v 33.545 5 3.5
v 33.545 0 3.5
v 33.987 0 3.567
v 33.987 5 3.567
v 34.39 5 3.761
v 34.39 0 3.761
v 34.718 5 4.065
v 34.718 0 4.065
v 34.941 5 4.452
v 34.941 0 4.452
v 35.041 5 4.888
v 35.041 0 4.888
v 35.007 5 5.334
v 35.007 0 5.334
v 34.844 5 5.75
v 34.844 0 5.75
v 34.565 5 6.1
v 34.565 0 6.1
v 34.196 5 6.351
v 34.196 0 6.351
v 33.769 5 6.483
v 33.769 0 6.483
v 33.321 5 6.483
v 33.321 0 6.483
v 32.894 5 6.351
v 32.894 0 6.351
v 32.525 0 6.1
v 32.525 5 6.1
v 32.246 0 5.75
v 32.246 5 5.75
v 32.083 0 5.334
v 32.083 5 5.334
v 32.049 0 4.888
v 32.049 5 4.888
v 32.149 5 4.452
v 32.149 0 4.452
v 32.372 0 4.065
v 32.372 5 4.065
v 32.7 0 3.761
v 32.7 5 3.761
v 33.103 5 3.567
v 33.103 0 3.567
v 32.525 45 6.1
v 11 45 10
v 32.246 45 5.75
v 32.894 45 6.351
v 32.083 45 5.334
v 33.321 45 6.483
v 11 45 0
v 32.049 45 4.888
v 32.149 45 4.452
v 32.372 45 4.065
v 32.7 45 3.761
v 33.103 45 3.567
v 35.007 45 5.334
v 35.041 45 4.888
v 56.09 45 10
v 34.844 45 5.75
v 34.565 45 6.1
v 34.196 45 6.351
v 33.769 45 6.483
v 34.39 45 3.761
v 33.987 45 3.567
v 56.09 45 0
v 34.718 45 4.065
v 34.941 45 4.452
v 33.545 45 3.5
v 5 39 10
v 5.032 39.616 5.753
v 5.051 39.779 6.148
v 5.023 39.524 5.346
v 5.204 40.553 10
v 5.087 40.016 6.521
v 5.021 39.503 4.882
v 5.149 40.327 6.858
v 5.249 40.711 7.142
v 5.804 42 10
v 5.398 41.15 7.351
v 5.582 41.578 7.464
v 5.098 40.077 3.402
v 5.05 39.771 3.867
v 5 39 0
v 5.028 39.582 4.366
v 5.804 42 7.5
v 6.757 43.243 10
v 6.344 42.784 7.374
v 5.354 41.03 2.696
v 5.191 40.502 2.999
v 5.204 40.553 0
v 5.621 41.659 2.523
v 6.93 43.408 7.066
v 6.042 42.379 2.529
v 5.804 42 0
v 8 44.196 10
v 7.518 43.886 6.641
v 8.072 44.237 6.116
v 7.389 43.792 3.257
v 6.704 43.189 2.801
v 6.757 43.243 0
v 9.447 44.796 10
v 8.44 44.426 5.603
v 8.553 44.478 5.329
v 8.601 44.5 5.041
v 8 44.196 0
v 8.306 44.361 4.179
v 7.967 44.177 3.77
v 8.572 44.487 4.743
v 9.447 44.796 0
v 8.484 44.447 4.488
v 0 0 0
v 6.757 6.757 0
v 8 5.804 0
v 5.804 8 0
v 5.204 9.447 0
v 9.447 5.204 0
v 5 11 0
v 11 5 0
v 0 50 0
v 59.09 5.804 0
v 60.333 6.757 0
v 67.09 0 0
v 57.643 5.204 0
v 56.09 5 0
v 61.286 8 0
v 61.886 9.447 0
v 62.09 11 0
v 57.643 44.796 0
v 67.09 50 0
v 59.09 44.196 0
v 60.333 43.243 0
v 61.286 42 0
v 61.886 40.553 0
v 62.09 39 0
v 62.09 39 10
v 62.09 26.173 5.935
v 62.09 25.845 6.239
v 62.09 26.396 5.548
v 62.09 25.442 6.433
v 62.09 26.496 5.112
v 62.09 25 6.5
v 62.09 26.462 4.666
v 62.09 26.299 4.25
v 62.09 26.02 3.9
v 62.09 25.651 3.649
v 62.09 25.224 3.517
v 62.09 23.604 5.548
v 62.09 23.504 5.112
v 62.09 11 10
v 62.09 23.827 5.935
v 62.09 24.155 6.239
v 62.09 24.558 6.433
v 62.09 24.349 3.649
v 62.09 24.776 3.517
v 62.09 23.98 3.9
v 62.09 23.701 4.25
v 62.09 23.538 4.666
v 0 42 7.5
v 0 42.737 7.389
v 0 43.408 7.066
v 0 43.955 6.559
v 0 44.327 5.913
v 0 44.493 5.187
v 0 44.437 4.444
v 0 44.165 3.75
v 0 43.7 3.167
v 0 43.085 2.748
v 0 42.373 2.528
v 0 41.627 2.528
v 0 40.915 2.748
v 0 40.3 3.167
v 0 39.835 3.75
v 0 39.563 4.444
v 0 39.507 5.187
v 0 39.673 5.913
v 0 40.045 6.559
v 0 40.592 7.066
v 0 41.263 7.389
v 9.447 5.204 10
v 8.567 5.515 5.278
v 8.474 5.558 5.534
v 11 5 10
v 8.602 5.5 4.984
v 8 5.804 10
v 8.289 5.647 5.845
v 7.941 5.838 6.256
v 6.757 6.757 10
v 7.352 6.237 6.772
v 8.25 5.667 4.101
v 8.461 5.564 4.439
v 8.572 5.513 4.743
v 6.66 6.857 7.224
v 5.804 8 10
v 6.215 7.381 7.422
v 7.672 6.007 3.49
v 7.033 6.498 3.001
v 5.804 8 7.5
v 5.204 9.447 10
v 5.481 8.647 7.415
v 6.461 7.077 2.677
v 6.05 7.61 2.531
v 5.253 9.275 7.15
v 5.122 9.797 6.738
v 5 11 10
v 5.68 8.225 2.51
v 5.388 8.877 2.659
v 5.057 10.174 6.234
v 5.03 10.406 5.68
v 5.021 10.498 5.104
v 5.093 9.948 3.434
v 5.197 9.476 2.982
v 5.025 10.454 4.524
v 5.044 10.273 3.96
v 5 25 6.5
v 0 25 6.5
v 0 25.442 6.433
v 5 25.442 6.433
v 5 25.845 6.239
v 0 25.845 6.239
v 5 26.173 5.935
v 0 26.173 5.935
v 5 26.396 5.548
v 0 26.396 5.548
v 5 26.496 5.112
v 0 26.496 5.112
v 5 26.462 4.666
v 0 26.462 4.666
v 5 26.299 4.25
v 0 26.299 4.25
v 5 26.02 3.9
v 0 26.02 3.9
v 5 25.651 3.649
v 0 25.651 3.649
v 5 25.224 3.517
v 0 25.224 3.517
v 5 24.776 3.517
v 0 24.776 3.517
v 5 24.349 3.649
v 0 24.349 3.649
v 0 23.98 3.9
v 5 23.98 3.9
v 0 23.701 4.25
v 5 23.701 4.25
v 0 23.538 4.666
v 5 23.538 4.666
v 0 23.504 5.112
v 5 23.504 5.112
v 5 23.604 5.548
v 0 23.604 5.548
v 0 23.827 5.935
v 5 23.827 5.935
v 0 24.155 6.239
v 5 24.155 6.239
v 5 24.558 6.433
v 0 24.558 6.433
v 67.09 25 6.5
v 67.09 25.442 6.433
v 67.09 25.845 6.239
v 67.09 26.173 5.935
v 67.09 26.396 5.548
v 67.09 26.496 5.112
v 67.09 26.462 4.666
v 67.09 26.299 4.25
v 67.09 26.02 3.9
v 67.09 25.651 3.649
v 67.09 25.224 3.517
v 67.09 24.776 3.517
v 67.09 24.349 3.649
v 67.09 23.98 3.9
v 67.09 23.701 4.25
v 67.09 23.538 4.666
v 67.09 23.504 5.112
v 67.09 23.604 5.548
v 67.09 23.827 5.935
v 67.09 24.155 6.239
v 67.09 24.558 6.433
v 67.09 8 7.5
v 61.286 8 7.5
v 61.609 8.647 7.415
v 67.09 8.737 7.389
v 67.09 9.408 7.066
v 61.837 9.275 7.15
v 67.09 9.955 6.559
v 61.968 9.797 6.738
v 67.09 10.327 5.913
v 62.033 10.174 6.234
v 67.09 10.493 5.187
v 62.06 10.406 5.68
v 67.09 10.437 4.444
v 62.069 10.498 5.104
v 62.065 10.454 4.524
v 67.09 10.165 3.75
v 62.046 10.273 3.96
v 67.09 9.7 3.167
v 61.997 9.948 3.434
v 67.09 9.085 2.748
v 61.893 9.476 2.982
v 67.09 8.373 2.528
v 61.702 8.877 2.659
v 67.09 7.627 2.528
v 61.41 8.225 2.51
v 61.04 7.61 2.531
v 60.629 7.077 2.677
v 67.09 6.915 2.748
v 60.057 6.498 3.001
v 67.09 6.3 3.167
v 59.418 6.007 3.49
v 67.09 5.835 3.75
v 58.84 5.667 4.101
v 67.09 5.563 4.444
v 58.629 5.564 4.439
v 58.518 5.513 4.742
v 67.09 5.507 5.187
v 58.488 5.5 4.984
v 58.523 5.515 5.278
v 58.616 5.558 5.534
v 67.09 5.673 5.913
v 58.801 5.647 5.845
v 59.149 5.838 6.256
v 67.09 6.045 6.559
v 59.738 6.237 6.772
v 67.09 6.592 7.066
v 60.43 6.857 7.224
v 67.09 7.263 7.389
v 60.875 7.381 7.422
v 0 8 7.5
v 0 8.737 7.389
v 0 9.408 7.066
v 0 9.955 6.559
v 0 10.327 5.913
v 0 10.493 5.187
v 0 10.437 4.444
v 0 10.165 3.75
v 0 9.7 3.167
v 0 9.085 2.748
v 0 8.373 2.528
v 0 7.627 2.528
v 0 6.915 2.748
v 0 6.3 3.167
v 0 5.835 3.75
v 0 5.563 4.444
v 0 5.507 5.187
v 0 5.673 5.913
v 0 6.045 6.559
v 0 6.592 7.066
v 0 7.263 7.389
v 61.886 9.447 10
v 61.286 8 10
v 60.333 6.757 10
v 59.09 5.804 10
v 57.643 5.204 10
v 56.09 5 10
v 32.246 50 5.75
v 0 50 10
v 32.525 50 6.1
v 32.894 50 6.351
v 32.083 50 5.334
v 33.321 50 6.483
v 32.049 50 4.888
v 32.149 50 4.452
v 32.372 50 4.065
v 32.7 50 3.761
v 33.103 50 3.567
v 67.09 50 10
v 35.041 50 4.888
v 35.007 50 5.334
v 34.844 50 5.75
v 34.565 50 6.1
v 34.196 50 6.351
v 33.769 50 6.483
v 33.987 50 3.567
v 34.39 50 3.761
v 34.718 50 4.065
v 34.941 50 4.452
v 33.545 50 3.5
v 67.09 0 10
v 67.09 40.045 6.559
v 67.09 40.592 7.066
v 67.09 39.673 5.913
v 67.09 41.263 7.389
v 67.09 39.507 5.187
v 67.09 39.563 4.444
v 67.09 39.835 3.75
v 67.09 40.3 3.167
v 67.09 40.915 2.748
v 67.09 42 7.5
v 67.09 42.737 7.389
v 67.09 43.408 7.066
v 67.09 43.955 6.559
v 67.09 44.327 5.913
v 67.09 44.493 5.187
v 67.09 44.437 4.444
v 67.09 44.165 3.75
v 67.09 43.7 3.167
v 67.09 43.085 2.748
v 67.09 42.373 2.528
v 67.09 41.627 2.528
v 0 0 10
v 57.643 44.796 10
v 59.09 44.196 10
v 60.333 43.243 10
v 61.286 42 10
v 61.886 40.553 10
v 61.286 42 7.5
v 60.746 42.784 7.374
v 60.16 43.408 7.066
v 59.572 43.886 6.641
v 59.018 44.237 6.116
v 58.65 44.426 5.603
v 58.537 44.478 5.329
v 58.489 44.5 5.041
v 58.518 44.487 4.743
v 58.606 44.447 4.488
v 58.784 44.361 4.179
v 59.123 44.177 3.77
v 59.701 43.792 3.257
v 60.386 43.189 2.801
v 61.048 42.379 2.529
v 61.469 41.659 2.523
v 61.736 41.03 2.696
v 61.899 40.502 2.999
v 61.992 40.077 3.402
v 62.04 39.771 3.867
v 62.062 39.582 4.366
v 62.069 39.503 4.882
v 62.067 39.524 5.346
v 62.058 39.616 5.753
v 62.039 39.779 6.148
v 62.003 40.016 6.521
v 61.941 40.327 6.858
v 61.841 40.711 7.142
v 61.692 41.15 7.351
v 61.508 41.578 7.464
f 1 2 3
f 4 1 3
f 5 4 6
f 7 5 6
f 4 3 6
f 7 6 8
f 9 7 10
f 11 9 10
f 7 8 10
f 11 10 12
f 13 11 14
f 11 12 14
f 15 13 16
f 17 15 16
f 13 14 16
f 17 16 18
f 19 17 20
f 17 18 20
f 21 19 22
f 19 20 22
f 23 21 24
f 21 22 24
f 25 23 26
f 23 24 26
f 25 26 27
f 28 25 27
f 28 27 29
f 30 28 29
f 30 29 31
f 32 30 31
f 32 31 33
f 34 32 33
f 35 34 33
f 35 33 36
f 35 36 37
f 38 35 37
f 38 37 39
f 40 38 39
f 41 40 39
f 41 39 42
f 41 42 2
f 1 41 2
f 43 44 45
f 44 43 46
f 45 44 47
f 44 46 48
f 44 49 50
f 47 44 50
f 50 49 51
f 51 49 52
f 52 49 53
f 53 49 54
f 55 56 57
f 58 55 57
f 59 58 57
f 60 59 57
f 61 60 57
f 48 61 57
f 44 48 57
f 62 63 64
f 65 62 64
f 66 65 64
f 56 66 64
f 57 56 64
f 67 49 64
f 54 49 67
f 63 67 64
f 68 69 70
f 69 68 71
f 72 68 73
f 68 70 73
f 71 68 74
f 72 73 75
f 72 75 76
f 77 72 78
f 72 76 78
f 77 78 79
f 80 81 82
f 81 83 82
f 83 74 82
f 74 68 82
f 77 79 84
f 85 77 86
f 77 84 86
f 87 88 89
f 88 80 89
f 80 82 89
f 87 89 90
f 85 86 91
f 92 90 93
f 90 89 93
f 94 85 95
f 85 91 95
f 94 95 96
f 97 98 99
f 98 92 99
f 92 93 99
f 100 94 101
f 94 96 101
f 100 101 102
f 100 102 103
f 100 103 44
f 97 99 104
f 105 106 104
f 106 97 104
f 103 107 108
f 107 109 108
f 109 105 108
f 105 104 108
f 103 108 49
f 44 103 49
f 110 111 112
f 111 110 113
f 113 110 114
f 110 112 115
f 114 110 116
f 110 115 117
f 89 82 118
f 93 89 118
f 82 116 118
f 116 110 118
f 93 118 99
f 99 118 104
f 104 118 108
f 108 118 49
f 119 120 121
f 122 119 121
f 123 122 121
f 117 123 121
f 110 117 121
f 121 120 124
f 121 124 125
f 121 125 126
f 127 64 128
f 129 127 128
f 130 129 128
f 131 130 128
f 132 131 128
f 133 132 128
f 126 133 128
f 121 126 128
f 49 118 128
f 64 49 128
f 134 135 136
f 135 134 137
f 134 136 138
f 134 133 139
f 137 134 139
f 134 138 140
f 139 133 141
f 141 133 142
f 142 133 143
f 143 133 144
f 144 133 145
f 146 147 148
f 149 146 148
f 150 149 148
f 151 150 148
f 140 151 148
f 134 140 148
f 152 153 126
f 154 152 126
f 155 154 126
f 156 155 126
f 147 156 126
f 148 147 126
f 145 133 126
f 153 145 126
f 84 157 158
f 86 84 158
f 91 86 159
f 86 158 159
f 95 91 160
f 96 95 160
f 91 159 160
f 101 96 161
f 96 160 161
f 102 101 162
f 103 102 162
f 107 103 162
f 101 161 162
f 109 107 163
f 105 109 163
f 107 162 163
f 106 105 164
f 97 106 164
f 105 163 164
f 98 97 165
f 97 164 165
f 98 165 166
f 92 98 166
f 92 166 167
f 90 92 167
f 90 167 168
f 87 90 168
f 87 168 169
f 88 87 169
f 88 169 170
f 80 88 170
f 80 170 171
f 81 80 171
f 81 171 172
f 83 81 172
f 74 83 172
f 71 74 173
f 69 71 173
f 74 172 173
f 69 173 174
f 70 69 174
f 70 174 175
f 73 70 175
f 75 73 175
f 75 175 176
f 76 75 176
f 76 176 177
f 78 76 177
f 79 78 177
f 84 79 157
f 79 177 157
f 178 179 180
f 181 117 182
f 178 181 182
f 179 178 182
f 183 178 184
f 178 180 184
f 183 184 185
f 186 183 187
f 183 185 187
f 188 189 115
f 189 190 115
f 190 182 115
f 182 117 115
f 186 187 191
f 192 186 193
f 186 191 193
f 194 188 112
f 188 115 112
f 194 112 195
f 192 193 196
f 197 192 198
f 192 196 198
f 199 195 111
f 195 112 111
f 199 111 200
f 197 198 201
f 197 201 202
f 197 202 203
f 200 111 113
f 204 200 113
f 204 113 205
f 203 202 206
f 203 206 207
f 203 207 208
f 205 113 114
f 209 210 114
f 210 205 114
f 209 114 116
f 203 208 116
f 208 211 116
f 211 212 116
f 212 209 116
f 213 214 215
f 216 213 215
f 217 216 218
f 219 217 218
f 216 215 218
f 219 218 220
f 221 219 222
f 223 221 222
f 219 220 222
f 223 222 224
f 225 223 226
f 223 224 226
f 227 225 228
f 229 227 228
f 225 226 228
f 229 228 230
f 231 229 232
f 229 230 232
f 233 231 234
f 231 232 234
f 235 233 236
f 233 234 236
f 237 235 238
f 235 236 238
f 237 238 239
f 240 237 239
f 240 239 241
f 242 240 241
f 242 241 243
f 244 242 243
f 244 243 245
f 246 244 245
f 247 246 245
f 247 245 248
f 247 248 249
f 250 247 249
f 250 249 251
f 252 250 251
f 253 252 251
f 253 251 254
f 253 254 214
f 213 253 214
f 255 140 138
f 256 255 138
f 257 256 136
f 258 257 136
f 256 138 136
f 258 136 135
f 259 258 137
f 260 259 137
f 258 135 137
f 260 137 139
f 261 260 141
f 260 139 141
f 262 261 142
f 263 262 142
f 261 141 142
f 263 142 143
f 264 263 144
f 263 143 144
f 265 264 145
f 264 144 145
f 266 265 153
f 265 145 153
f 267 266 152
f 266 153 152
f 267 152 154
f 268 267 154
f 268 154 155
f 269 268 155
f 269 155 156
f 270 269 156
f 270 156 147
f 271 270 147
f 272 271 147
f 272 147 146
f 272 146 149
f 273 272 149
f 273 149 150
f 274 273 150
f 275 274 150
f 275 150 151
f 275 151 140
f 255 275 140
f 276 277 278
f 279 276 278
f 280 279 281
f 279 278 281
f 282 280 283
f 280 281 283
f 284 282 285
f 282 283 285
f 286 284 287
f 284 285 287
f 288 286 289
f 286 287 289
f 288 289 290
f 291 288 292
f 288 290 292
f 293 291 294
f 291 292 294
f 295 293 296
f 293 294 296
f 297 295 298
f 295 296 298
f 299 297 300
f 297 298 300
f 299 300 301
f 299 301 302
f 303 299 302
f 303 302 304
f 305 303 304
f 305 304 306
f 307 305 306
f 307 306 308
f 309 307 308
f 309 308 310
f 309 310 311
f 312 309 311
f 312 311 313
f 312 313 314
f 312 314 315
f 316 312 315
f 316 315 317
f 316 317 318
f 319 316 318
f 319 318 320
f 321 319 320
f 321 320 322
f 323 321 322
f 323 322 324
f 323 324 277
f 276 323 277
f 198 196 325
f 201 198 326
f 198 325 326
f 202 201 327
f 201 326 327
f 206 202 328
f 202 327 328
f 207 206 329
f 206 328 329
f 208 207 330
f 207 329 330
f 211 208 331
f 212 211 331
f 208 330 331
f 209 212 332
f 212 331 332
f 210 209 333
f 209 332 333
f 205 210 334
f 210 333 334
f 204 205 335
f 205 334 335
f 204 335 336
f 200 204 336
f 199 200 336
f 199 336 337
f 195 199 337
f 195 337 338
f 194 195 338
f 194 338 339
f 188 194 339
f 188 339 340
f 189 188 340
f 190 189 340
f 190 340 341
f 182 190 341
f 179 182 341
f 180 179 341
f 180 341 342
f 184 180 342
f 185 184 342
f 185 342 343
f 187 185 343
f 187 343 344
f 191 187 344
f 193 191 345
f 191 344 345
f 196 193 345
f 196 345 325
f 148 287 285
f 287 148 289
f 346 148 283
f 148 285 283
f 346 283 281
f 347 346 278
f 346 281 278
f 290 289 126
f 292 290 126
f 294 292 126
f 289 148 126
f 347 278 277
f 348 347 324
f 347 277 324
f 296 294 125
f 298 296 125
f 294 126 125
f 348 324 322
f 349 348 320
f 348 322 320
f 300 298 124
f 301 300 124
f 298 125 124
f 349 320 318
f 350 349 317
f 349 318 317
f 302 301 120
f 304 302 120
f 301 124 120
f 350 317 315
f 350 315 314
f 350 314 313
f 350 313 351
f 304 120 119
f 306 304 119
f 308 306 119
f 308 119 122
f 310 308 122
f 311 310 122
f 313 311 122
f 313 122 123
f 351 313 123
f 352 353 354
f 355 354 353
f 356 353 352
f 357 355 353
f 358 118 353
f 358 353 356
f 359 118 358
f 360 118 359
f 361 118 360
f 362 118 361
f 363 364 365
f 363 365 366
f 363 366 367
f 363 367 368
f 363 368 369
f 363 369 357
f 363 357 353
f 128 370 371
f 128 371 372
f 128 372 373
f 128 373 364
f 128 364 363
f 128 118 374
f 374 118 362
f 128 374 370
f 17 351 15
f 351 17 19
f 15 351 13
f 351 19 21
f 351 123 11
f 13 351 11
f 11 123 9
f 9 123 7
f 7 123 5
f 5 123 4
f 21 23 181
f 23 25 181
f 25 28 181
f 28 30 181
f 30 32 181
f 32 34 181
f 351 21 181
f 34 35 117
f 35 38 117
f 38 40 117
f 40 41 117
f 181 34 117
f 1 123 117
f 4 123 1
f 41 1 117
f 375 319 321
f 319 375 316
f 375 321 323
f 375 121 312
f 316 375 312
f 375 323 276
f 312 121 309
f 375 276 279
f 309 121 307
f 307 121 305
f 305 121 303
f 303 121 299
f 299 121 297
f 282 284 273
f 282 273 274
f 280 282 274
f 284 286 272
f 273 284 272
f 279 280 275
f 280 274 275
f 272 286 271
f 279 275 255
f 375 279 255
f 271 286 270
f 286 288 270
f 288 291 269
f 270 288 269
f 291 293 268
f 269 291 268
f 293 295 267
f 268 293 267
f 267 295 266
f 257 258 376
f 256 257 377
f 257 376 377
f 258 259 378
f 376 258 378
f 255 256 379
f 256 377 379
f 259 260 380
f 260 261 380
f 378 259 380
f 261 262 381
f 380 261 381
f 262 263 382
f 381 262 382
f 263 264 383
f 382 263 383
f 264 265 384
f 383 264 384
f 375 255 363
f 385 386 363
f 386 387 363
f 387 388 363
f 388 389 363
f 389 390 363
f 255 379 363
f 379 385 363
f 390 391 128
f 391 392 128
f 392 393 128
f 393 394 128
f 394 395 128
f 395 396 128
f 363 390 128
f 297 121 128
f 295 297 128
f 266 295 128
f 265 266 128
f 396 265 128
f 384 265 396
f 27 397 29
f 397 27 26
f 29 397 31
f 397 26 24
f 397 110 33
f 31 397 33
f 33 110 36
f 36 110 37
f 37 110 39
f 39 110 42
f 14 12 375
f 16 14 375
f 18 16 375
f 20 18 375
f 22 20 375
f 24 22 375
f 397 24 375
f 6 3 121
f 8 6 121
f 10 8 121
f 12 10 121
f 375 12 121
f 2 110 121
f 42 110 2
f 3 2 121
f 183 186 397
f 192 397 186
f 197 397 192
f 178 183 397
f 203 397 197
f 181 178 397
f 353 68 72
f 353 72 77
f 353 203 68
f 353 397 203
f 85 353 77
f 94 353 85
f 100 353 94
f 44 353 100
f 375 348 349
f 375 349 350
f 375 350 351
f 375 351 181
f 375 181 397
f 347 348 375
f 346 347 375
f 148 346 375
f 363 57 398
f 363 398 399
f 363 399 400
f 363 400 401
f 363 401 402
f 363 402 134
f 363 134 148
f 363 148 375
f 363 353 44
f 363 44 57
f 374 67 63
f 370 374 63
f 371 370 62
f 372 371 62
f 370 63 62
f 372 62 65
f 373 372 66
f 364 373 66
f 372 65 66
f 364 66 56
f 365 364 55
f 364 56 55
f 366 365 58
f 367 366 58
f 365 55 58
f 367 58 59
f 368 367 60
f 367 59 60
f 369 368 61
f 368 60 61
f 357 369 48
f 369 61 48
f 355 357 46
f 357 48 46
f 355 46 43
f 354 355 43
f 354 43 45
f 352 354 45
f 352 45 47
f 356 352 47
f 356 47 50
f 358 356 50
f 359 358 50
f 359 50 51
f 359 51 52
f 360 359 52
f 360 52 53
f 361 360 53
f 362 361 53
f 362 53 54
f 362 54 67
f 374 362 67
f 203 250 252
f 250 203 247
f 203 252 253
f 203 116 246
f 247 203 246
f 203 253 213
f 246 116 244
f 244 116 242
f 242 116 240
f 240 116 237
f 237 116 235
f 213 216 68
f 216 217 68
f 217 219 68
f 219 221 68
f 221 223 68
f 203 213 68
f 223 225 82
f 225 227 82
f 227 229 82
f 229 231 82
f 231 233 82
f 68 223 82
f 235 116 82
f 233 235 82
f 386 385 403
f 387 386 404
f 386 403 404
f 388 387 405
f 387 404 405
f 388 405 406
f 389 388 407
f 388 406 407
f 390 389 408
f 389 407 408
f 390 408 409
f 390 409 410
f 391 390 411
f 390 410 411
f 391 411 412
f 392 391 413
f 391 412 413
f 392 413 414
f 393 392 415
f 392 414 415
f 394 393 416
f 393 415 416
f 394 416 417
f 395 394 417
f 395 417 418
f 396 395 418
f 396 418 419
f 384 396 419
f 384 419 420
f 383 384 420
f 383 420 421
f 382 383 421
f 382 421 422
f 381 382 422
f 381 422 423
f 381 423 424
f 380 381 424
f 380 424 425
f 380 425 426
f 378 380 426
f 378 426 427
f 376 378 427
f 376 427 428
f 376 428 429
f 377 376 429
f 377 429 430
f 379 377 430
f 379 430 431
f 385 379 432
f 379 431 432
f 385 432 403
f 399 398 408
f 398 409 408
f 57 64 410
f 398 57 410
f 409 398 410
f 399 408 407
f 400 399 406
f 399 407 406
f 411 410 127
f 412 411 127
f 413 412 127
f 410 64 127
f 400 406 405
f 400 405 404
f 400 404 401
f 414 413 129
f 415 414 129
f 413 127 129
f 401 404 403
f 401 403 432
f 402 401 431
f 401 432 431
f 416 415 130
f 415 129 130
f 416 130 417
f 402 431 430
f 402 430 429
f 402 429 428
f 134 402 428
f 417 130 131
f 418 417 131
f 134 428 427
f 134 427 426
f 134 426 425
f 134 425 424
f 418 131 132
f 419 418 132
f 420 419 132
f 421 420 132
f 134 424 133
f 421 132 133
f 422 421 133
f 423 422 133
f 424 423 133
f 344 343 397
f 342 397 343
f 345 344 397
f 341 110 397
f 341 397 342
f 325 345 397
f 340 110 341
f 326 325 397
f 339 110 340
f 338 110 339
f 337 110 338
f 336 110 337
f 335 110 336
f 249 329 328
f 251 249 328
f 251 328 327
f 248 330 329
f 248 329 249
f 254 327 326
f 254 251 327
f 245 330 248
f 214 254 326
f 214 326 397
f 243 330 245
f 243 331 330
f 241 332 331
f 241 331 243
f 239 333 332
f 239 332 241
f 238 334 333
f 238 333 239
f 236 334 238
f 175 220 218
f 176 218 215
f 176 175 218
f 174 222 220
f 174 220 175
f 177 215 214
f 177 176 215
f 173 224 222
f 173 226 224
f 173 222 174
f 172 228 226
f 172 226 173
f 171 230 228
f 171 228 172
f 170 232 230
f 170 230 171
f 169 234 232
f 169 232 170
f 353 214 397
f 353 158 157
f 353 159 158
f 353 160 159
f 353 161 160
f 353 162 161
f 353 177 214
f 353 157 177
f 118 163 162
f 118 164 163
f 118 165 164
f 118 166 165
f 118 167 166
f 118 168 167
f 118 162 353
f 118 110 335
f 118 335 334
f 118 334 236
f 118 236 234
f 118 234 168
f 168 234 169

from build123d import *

# Parameters (mm, degrees)
SKETCH_1_W          = 67.09
SKETCH_1_H          = 50
EXTRUDE_1_DEPTH     = 10
SKETCH_2_R          = 2.5
SKETCH_2_R_2        = 1.5
CUT_EXTRUDE_1_DEPTH = 85.267835501
SKETCH_3_R          = 1.5
CUT_EXTRUDE_2_DEPTH = 85.267835592


with BuildPart() as part:
    # 草图1 → 凸台-拉伸1 (new body)
    with BuildSketch(Plane.XY):
        with Locations((33.545, 25)):
            Rectangle(SKETCH_1_W, SKETCH_1_H)
        with BuildLine():
            Line((11, 45), (56.09, 45))
            ThreePointArc((56.09, 45), (60.332640687, 43.242640687), (62.09, 39))
            Line((62.09, 39), (62.09, 11))
            ThreePointArc((62.09, 11), (60.332640687, 6.757359313), (56.09, 5))
            Line((56.09, 5), (11, 5))
            ThreePointArc((11, 5), (6.757359313, 6.757359313), (5, 11))
            Line((5, 11), (5, 39))
            ThreePointArc((5, 39), (6.757359313, 43.242640687), (11, 45))
        make_face(mode=Mode.SUBTRACT)
    extrude(amount=EXTRUDE_1_DEPTH)

    # 草图2 → 切除-拉伸1 (cut, through all)
    with BuildSketch(Plane.ZY):
        with Locations((5, 42)):
            Circle(SKETCH_2_R)
        with Locations((5, 8)):
            Circle(SKETCH_2_R)
        with Locations((5, 25)):
            Circle(SKETCH_2_R_2)
    extrude(amount=-CUT_EXTRUDE_1_DEPTH, mode=Mode.SUBTRACT)

    # 草图3 → 切除-拉伸2 (cut, through all)
    with BuildSketch(Plane.XZ):
        with Locations(Location((33.545, 5, 0), (0, 0, 270))):
            Circle(SKETCH_3_R)
    extrude(amount=-CUT_EXTRUDE_2_DEPTH, mode=Mode.SUBTRACT)


solid = part.part
